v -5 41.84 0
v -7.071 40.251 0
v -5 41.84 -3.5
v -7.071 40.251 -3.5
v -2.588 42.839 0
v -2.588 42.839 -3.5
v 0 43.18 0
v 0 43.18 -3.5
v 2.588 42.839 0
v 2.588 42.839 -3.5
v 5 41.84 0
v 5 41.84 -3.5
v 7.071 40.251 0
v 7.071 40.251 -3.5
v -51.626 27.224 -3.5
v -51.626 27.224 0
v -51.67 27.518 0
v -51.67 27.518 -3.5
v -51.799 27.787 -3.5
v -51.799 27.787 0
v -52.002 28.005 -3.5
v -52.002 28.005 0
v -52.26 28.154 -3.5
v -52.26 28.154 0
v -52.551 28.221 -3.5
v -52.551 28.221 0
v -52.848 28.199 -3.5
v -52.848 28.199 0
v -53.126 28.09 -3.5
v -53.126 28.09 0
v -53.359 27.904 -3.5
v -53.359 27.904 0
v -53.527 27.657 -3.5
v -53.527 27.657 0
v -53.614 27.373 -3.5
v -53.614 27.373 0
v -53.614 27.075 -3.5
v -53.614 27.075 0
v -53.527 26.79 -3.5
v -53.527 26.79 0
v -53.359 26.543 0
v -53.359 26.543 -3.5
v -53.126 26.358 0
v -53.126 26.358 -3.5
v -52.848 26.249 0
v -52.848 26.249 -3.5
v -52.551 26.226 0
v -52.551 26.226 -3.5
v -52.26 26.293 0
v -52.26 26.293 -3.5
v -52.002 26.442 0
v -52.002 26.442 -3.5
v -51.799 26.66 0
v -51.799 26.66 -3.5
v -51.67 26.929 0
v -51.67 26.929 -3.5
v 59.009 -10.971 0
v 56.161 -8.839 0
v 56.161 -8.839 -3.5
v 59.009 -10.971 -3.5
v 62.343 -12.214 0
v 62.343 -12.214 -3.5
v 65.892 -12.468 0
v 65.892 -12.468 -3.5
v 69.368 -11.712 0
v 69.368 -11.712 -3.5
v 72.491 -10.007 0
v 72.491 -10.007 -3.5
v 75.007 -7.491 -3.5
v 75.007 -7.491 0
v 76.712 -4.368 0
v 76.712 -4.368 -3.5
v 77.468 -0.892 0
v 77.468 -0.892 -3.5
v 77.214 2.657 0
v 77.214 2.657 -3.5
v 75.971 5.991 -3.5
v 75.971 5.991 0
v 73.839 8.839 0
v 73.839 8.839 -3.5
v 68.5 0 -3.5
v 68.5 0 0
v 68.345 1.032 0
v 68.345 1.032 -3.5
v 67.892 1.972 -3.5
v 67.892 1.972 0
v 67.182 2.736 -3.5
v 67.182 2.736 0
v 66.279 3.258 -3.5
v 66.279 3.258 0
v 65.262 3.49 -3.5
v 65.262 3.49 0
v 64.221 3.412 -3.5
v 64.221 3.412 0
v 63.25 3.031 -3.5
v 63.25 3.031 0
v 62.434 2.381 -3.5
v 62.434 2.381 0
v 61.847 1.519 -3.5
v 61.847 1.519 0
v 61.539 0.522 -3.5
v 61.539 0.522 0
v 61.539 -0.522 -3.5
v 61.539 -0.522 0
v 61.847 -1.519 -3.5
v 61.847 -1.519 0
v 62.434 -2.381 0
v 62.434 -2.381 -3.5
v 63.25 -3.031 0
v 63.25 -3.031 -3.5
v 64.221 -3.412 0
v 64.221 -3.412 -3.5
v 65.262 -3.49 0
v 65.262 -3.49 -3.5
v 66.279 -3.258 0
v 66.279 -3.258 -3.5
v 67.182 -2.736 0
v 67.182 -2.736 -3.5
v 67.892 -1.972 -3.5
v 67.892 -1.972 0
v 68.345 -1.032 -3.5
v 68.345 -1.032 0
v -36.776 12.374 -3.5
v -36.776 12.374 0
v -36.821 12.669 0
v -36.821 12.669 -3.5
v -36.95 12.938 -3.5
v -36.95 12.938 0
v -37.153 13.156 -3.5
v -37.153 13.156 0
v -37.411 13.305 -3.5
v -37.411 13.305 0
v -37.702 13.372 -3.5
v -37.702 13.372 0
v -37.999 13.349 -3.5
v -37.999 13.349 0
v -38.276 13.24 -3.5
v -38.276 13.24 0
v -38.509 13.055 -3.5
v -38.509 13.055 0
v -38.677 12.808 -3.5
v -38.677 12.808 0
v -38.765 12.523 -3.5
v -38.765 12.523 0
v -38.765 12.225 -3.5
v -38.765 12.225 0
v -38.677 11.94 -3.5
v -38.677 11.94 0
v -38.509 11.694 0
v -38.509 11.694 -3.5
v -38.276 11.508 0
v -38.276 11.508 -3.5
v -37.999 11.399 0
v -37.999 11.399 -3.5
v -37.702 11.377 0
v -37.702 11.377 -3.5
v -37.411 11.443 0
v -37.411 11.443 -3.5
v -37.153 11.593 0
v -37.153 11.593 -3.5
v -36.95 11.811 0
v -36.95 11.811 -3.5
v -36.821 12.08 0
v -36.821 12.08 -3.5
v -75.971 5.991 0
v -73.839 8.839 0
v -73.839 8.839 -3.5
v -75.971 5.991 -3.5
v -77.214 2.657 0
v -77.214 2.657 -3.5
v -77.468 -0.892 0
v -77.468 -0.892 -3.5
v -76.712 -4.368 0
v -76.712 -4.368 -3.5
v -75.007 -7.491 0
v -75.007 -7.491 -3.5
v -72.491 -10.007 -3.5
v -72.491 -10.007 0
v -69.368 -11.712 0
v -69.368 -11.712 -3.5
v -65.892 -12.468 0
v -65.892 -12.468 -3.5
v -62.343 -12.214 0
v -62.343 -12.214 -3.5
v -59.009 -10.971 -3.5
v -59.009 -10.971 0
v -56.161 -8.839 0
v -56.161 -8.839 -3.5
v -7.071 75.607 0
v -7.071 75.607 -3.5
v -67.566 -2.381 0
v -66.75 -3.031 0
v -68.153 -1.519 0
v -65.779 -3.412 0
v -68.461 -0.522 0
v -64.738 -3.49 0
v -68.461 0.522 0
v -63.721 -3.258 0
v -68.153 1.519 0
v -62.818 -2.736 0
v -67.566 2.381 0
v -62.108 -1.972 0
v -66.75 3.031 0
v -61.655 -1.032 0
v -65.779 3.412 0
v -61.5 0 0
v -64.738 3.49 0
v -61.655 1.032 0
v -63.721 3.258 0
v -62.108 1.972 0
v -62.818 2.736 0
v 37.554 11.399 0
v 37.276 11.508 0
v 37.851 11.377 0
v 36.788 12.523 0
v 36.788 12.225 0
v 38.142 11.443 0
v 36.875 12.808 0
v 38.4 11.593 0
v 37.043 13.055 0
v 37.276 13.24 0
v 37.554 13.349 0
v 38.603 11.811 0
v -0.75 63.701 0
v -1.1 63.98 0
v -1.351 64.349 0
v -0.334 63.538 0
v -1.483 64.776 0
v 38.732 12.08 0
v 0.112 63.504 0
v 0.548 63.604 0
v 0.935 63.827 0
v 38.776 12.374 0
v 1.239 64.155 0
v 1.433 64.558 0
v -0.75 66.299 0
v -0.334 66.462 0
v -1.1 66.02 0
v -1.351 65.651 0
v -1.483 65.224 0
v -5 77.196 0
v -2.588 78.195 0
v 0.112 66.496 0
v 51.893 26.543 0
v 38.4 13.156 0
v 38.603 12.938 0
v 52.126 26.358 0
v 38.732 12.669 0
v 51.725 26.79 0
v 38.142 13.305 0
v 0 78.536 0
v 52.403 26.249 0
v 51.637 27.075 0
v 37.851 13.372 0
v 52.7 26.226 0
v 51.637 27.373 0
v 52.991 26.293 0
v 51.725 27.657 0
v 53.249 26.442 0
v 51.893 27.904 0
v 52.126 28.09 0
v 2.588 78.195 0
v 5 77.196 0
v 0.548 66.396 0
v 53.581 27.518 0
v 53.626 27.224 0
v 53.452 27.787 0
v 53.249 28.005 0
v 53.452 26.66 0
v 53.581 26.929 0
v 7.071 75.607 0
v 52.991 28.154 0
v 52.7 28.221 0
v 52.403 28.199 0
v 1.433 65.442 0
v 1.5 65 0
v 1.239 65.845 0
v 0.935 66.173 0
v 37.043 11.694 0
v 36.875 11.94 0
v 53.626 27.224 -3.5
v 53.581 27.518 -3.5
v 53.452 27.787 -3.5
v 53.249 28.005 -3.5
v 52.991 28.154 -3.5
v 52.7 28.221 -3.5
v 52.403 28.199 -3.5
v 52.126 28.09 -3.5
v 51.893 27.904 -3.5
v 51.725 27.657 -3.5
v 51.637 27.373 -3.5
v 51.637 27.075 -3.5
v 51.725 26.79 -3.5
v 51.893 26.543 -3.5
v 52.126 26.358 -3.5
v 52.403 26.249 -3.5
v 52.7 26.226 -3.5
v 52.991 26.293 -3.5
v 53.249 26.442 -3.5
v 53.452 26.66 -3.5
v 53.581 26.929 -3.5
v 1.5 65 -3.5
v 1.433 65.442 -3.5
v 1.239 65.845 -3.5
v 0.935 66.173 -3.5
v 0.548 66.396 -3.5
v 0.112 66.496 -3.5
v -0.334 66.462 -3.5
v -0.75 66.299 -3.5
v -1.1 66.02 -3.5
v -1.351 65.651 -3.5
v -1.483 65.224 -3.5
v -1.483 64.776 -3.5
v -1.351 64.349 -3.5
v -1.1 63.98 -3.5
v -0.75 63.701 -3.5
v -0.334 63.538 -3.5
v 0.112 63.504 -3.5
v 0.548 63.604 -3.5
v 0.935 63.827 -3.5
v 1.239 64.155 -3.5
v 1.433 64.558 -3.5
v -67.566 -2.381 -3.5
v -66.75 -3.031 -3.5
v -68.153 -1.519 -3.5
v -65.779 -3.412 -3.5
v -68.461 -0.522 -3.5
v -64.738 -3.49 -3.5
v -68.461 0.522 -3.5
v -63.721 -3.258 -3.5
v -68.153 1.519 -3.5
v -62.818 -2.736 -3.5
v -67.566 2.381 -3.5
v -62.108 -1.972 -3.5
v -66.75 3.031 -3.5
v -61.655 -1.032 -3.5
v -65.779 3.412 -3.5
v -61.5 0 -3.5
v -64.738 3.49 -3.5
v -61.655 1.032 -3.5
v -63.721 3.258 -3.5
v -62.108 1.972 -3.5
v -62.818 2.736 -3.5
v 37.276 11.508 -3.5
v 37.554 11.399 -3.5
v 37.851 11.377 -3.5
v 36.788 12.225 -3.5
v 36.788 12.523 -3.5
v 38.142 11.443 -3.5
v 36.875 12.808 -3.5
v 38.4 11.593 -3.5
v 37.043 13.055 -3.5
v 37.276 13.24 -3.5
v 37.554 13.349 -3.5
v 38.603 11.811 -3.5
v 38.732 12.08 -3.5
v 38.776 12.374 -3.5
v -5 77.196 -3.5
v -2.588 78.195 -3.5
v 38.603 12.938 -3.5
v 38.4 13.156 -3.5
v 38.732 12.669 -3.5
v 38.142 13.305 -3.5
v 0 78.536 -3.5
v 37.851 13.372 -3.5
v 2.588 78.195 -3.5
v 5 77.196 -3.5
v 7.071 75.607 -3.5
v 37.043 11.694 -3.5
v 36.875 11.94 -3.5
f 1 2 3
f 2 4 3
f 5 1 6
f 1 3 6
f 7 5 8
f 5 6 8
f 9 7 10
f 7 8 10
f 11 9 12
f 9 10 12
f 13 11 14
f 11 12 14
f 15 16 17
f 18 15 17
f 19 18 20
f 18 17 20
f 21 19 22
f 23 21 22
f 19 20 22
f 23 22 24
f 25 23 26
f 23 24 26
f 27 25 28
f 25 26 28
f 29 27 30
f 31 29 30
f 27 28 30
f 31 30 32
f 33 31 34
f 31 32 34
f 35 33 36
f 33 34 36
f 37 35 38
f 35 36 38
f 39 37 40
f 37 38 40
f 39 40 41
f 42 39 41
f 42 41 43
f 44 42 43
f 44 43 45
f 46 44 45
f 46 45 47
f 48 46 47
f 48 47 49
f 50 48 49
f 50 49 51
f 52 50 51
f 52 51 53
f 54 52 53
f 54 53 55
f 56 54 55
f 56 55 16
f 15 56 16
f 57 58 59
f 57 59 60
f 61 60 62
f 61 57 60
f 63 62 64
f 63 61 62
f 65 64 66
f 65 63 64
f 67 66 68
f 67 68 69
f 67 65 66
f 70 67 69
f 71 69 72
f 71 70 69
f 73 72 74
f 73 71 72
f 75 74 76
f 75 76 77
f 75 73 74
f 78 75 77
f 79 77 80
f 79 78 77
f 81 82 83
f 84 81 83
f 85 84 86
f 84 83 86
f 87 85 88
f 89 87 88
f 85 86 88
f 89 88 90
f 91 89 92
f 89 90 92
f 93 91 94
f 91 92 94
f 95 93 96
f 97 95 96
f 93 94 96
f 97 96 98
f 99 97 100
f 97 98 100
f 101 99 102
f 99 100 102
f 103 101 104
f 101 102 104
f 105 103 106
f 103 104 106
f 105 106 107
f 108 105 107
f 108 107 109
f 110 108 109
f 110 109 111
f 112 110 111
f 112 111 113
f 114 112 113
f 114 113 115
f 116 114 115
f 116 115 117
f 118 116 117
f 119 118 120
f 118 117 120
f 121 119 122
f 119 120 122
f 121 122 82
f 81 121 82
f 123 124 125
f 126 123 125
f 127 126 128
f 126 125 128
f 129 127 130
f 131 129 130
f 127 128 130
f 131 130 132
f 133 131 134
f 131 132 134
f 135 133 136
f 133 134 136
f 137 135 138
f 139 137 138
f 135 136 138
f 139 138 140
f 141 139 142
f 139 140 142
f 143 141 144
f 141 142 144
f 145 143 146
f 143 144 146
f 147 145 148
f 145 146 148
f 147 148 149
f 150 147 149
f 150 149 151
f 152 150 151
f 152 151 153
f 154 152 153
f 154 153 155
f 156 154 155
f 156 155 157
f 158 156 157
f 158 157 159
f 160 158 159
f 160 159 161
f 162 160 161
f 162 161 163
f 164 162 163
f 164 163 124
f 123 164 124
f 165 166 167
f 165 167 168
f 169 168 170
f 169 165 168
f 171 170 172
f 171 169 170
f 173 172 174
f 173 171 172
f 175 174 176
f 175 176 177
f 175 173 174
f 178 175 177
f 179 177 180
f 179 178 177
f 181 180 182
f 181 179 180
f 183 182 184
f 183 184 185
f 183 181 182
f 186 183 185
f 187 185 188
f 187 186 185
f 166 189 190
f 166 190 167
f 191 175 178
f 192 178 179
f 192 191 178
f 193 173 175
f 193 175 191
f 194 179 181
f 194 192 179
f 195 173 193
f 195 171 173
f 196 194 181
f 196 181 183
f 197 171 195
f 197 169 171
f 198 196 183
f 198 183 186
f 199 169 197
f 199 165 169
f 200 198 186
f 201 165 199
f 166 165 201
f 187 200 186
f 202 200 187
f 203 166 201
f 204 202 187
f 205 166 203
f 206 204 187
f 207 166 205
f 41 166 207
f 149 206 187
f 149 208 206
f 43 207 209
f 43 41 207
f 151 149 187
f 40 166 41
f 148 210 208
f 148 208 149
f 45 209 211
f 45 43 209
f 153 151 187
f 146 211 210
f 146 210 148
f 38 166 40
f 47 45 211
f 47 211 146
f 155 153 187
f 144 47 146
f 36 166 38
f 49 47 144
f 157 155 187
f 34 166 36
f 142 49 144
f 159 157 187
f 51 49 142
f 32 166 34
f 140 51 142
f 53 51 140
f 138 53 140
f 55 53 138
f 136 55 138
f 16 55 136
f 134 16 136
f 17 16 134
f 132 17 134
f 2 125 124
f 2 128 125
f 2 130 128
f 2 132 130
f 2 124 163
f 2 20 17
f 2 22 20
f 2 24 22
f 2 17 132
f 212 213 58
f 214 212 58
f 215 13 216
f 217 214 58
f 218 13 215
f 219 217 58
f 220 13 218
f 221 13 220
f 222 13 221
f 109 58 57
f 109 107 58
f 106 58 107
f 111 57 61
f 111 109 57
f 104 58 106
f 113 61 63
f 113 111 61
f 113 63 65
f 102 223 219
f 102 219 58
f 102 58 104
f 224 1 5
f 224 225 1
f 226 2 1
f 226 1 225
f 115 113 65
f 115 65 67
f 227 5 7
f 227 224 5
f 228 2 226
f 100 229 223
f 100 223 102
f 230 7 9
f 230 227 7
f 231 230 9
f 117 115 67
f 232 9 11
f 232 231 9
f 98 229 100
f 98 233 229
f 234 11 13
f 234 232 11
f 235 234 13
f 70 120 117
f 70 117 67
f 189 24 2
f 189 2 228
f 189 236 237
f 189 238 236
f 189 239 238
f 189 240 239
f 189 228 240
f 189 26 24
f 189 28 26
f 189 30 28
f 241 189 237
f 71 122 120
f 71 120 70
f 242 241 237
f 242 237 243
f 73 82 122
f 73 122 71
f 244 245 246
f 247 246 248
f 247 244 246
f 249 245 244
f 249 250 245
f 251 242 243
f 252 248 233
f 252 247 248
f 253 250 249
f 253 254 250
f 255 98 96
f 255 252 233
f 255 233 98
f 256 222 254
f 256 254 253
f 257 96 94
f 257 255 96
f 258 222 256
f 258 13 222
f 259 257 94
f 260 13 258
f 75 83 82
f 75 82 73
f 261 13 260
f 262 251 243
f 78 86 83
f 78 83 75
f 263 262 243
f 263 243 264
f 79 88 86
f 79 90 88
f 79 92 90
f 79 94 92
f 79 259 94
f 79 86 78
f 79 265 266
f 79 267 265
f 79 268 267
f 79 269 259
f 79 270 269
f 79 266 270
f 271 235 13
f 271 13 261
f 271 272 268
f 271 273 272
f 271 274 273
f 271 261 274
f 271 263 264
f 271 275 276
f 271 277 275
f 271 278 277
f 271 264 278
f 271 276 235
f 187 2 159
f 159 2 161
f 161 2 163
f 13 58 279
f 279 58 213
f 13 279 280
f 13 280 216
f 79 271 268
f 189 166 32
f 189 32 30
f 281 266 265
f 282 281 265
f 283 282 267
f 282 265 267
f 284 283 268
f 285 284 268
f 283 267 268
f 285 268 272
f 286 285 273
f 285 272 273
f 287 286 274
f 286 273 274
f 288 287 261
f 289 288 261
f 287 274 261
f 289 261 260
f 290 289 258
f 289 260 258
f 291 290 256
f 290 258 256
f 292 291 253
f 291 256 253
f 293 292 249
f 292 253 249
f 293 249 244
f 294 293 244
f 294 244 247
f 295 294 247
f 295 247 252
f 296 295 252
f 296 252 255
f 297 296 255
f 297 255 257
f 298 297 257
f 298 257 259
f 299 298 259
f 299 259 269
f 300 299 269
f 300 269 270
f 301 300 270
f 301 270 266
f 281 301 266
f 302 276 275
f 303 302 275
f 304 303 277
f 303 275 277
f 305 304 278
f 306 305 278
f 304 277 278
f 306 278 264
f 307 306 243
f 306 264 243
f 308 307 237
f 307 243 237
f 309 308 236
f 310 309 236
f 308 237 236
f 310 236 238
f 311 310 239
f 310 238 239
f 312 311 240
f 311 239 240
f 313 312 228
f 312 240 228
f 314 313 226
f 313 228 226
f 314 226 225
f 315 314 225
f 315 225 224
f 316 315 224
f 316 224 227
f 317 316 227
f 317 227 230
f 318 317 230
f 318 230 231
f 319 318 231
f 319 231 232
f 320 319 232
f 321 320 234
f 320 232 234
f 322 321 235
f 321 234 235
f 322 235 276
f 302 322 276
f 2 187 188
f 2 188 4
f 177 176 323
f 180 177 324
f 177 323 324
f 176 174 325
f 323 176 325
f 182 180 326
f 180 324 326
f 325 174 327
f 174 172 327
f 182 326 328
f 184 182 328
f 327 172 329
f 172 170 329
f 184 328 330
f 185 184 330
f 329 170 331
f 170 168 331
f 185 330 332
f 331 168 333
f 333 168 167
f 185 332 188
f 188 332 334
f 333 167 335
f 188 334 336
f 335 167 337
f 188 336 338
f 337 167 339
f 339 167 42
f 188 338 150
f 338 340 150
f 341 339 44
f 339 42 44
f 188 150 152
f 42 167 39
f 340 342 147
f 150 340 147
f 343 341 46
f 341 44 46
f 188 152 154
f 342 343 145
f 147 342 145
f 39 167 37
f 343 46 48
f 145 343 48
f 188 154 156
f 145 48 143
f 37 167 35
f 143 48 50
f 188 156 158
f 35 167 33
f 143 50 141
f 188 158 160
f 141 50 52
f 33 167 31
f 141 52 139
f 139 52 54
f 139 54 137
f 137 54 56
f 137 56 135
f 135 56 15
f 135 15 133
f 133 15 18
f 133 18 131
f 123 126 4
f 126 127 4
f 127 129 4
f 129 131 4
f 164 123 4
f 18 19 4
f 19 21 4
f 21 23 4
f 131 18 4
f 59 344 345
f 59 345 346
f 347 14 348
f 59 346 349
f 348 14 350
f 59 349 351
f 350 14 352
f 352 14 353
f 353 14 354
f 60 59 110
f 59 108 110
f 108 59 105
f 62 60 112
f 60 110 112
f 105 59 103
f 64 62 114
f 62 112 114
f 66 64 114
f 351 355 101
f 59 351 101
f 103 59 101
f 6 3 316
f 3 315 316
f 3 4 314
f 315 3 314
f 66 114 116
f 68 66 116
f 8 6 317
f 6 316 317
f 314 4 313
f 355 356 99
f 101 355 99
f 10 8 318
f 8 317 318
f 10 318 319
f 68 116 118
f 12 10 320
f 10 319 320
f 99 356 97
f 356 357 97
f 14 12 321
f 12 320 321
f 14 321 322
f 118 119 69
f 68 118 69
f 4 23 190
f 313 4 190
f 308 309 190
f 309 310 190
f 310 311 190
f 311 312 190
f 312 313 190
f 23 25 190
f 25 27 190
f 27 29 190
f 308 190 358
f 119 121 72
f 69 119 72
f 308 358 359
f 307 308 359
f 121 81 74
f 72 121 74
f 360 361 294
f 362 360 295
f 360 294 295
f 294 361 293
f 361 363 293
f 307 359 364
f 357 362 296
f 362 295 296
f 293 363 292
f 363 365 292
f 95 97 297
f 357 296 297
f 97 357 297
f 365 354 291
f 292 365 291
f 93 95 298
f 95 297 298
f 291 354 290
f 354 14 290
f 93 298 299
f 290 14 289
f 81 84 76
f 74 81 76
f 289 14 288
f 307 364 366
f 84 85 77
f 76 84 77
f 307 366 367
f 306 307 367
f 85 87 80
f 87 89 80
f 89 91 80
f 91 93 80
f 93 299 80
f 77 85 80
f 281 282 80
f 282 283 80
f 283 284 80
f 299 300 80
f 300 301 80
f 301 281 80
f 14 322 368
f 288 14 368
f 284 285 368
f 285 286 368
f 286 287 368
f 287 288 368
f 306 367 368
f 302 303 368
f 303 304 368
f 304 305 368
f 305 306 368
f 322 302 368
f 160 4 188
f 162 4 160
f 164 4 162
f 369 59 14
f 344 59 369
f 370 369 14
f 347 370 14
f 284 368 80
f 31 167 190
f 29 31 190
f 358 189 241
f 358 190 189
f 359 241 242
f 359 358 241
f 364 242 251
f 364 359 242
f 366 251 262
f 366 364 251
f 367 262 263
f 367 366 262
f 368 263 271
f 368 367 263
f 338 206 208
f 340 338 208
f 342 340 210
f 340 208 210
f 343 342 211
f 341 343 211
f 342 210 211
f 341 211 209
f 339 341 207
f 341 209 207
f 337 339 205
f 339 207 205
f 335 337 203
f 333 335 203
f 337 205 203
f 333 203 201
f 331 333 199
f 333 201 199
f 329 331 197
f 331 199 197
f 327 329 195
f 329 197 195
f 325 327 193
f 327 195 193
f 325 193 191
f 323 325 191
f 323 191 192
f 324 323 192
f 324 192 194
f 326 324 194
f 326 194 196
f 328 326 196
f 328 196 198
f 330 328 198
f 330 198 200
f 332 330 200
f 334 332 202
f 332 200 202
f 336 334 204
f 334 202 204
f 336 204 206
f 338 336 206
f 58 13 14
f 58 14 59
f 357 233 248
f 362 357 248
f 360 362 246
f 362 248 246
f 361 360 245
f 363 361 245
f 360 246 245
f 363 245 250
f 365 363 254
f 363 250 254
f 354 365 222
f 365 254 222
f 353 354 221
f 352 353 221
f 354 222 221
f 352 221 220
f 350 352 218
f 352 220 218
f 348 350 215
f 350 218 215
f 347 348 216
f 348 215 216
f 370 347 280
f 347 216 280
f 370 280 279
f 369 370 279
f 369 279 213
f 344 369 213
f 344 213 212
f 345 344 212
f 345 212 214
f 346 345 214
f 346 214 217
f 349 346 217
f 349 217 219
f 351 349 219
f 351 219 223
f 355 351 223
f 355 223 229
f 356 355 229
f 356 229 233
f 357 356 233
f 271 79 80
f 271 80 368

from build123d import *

# Parameters (mm, degrees)
SKETCH2_R           = 3.5
SKETCH2_R_2         = 1.5
BOSS_EXTRUDE1_DEPTH = 3.5
FILLET1_R           = 10
SKETCH3_R           = 1
CUT_EXTRUDE1_DEPTH  = 10


with BuildPart() as part:
    # Sketch2 → Boss-Extrude1 (new body)
    with BuildSketch(Plane.XY):
        with BuildLine():
            Line((-56.161165235, -8.838834765), (0, 47.32233047))
            Line((0, 47.32233047), (56.161165235, -8.838834765))
            ThreePointArc((56.161165235, -8.838834765), (73.838834765, -8.838834765), (73.838834765, 8.838834765))
            Line((73.838834765, 8.838834765), (0, 82.67766953))
            Line((0, 82.67766953), (-73.838834765, 8.838834765))
            ThreePointArc((-73.838834765, 8.838834765), (-73.838834765, -8.838834765), (-56.161165235, -8.838834765))
        make_face()
        with Locations((-65, 0)):
            Circle(SKETCH2_R, mode=Mode.SUBTRACT)
        with Locations((65, 0)):
            Circle(SKETCH2_R, mode=Mode.SUBTRACT)
        with Locations((0, 65)):
            Circle(SKETCH2_R_2, mode=Mode.SUBTRACT)
    extrude(amount=-BOSS_EXTRUDE1_DEPTH)

    # Fillet1
    fillet1_edges = [part.edges().sort_by_distance(p)[0] for p in [
        (0, 82.67766953, -1.75),
        (0, 47.32233047, -1.75),
    ]]
    fillet(fillet1_edges, radius=FILLET1_R)

    # Sketch3 → Cut-Extrude1 (cut)
    with BuildSketch(Plane.XY):
        with Locations((-52.625631329, 27.223611076)):
            Circle(SKETCH3_R)
        with Locations((-37.776388924, 12.374368671)):
            Circle(SKETCH3_R)
        with Locations((37.776388924, 12.374368671)):
            Circle(SKETCH3_R)
        with Locations((52.625631329, 27.223611076)):
            Circle(SKETCH3_R)
    extrude(amount=-CUT_EXTRUDE1_DEPTH, mode=Mode.SUBTRACT)


solid = part.part
